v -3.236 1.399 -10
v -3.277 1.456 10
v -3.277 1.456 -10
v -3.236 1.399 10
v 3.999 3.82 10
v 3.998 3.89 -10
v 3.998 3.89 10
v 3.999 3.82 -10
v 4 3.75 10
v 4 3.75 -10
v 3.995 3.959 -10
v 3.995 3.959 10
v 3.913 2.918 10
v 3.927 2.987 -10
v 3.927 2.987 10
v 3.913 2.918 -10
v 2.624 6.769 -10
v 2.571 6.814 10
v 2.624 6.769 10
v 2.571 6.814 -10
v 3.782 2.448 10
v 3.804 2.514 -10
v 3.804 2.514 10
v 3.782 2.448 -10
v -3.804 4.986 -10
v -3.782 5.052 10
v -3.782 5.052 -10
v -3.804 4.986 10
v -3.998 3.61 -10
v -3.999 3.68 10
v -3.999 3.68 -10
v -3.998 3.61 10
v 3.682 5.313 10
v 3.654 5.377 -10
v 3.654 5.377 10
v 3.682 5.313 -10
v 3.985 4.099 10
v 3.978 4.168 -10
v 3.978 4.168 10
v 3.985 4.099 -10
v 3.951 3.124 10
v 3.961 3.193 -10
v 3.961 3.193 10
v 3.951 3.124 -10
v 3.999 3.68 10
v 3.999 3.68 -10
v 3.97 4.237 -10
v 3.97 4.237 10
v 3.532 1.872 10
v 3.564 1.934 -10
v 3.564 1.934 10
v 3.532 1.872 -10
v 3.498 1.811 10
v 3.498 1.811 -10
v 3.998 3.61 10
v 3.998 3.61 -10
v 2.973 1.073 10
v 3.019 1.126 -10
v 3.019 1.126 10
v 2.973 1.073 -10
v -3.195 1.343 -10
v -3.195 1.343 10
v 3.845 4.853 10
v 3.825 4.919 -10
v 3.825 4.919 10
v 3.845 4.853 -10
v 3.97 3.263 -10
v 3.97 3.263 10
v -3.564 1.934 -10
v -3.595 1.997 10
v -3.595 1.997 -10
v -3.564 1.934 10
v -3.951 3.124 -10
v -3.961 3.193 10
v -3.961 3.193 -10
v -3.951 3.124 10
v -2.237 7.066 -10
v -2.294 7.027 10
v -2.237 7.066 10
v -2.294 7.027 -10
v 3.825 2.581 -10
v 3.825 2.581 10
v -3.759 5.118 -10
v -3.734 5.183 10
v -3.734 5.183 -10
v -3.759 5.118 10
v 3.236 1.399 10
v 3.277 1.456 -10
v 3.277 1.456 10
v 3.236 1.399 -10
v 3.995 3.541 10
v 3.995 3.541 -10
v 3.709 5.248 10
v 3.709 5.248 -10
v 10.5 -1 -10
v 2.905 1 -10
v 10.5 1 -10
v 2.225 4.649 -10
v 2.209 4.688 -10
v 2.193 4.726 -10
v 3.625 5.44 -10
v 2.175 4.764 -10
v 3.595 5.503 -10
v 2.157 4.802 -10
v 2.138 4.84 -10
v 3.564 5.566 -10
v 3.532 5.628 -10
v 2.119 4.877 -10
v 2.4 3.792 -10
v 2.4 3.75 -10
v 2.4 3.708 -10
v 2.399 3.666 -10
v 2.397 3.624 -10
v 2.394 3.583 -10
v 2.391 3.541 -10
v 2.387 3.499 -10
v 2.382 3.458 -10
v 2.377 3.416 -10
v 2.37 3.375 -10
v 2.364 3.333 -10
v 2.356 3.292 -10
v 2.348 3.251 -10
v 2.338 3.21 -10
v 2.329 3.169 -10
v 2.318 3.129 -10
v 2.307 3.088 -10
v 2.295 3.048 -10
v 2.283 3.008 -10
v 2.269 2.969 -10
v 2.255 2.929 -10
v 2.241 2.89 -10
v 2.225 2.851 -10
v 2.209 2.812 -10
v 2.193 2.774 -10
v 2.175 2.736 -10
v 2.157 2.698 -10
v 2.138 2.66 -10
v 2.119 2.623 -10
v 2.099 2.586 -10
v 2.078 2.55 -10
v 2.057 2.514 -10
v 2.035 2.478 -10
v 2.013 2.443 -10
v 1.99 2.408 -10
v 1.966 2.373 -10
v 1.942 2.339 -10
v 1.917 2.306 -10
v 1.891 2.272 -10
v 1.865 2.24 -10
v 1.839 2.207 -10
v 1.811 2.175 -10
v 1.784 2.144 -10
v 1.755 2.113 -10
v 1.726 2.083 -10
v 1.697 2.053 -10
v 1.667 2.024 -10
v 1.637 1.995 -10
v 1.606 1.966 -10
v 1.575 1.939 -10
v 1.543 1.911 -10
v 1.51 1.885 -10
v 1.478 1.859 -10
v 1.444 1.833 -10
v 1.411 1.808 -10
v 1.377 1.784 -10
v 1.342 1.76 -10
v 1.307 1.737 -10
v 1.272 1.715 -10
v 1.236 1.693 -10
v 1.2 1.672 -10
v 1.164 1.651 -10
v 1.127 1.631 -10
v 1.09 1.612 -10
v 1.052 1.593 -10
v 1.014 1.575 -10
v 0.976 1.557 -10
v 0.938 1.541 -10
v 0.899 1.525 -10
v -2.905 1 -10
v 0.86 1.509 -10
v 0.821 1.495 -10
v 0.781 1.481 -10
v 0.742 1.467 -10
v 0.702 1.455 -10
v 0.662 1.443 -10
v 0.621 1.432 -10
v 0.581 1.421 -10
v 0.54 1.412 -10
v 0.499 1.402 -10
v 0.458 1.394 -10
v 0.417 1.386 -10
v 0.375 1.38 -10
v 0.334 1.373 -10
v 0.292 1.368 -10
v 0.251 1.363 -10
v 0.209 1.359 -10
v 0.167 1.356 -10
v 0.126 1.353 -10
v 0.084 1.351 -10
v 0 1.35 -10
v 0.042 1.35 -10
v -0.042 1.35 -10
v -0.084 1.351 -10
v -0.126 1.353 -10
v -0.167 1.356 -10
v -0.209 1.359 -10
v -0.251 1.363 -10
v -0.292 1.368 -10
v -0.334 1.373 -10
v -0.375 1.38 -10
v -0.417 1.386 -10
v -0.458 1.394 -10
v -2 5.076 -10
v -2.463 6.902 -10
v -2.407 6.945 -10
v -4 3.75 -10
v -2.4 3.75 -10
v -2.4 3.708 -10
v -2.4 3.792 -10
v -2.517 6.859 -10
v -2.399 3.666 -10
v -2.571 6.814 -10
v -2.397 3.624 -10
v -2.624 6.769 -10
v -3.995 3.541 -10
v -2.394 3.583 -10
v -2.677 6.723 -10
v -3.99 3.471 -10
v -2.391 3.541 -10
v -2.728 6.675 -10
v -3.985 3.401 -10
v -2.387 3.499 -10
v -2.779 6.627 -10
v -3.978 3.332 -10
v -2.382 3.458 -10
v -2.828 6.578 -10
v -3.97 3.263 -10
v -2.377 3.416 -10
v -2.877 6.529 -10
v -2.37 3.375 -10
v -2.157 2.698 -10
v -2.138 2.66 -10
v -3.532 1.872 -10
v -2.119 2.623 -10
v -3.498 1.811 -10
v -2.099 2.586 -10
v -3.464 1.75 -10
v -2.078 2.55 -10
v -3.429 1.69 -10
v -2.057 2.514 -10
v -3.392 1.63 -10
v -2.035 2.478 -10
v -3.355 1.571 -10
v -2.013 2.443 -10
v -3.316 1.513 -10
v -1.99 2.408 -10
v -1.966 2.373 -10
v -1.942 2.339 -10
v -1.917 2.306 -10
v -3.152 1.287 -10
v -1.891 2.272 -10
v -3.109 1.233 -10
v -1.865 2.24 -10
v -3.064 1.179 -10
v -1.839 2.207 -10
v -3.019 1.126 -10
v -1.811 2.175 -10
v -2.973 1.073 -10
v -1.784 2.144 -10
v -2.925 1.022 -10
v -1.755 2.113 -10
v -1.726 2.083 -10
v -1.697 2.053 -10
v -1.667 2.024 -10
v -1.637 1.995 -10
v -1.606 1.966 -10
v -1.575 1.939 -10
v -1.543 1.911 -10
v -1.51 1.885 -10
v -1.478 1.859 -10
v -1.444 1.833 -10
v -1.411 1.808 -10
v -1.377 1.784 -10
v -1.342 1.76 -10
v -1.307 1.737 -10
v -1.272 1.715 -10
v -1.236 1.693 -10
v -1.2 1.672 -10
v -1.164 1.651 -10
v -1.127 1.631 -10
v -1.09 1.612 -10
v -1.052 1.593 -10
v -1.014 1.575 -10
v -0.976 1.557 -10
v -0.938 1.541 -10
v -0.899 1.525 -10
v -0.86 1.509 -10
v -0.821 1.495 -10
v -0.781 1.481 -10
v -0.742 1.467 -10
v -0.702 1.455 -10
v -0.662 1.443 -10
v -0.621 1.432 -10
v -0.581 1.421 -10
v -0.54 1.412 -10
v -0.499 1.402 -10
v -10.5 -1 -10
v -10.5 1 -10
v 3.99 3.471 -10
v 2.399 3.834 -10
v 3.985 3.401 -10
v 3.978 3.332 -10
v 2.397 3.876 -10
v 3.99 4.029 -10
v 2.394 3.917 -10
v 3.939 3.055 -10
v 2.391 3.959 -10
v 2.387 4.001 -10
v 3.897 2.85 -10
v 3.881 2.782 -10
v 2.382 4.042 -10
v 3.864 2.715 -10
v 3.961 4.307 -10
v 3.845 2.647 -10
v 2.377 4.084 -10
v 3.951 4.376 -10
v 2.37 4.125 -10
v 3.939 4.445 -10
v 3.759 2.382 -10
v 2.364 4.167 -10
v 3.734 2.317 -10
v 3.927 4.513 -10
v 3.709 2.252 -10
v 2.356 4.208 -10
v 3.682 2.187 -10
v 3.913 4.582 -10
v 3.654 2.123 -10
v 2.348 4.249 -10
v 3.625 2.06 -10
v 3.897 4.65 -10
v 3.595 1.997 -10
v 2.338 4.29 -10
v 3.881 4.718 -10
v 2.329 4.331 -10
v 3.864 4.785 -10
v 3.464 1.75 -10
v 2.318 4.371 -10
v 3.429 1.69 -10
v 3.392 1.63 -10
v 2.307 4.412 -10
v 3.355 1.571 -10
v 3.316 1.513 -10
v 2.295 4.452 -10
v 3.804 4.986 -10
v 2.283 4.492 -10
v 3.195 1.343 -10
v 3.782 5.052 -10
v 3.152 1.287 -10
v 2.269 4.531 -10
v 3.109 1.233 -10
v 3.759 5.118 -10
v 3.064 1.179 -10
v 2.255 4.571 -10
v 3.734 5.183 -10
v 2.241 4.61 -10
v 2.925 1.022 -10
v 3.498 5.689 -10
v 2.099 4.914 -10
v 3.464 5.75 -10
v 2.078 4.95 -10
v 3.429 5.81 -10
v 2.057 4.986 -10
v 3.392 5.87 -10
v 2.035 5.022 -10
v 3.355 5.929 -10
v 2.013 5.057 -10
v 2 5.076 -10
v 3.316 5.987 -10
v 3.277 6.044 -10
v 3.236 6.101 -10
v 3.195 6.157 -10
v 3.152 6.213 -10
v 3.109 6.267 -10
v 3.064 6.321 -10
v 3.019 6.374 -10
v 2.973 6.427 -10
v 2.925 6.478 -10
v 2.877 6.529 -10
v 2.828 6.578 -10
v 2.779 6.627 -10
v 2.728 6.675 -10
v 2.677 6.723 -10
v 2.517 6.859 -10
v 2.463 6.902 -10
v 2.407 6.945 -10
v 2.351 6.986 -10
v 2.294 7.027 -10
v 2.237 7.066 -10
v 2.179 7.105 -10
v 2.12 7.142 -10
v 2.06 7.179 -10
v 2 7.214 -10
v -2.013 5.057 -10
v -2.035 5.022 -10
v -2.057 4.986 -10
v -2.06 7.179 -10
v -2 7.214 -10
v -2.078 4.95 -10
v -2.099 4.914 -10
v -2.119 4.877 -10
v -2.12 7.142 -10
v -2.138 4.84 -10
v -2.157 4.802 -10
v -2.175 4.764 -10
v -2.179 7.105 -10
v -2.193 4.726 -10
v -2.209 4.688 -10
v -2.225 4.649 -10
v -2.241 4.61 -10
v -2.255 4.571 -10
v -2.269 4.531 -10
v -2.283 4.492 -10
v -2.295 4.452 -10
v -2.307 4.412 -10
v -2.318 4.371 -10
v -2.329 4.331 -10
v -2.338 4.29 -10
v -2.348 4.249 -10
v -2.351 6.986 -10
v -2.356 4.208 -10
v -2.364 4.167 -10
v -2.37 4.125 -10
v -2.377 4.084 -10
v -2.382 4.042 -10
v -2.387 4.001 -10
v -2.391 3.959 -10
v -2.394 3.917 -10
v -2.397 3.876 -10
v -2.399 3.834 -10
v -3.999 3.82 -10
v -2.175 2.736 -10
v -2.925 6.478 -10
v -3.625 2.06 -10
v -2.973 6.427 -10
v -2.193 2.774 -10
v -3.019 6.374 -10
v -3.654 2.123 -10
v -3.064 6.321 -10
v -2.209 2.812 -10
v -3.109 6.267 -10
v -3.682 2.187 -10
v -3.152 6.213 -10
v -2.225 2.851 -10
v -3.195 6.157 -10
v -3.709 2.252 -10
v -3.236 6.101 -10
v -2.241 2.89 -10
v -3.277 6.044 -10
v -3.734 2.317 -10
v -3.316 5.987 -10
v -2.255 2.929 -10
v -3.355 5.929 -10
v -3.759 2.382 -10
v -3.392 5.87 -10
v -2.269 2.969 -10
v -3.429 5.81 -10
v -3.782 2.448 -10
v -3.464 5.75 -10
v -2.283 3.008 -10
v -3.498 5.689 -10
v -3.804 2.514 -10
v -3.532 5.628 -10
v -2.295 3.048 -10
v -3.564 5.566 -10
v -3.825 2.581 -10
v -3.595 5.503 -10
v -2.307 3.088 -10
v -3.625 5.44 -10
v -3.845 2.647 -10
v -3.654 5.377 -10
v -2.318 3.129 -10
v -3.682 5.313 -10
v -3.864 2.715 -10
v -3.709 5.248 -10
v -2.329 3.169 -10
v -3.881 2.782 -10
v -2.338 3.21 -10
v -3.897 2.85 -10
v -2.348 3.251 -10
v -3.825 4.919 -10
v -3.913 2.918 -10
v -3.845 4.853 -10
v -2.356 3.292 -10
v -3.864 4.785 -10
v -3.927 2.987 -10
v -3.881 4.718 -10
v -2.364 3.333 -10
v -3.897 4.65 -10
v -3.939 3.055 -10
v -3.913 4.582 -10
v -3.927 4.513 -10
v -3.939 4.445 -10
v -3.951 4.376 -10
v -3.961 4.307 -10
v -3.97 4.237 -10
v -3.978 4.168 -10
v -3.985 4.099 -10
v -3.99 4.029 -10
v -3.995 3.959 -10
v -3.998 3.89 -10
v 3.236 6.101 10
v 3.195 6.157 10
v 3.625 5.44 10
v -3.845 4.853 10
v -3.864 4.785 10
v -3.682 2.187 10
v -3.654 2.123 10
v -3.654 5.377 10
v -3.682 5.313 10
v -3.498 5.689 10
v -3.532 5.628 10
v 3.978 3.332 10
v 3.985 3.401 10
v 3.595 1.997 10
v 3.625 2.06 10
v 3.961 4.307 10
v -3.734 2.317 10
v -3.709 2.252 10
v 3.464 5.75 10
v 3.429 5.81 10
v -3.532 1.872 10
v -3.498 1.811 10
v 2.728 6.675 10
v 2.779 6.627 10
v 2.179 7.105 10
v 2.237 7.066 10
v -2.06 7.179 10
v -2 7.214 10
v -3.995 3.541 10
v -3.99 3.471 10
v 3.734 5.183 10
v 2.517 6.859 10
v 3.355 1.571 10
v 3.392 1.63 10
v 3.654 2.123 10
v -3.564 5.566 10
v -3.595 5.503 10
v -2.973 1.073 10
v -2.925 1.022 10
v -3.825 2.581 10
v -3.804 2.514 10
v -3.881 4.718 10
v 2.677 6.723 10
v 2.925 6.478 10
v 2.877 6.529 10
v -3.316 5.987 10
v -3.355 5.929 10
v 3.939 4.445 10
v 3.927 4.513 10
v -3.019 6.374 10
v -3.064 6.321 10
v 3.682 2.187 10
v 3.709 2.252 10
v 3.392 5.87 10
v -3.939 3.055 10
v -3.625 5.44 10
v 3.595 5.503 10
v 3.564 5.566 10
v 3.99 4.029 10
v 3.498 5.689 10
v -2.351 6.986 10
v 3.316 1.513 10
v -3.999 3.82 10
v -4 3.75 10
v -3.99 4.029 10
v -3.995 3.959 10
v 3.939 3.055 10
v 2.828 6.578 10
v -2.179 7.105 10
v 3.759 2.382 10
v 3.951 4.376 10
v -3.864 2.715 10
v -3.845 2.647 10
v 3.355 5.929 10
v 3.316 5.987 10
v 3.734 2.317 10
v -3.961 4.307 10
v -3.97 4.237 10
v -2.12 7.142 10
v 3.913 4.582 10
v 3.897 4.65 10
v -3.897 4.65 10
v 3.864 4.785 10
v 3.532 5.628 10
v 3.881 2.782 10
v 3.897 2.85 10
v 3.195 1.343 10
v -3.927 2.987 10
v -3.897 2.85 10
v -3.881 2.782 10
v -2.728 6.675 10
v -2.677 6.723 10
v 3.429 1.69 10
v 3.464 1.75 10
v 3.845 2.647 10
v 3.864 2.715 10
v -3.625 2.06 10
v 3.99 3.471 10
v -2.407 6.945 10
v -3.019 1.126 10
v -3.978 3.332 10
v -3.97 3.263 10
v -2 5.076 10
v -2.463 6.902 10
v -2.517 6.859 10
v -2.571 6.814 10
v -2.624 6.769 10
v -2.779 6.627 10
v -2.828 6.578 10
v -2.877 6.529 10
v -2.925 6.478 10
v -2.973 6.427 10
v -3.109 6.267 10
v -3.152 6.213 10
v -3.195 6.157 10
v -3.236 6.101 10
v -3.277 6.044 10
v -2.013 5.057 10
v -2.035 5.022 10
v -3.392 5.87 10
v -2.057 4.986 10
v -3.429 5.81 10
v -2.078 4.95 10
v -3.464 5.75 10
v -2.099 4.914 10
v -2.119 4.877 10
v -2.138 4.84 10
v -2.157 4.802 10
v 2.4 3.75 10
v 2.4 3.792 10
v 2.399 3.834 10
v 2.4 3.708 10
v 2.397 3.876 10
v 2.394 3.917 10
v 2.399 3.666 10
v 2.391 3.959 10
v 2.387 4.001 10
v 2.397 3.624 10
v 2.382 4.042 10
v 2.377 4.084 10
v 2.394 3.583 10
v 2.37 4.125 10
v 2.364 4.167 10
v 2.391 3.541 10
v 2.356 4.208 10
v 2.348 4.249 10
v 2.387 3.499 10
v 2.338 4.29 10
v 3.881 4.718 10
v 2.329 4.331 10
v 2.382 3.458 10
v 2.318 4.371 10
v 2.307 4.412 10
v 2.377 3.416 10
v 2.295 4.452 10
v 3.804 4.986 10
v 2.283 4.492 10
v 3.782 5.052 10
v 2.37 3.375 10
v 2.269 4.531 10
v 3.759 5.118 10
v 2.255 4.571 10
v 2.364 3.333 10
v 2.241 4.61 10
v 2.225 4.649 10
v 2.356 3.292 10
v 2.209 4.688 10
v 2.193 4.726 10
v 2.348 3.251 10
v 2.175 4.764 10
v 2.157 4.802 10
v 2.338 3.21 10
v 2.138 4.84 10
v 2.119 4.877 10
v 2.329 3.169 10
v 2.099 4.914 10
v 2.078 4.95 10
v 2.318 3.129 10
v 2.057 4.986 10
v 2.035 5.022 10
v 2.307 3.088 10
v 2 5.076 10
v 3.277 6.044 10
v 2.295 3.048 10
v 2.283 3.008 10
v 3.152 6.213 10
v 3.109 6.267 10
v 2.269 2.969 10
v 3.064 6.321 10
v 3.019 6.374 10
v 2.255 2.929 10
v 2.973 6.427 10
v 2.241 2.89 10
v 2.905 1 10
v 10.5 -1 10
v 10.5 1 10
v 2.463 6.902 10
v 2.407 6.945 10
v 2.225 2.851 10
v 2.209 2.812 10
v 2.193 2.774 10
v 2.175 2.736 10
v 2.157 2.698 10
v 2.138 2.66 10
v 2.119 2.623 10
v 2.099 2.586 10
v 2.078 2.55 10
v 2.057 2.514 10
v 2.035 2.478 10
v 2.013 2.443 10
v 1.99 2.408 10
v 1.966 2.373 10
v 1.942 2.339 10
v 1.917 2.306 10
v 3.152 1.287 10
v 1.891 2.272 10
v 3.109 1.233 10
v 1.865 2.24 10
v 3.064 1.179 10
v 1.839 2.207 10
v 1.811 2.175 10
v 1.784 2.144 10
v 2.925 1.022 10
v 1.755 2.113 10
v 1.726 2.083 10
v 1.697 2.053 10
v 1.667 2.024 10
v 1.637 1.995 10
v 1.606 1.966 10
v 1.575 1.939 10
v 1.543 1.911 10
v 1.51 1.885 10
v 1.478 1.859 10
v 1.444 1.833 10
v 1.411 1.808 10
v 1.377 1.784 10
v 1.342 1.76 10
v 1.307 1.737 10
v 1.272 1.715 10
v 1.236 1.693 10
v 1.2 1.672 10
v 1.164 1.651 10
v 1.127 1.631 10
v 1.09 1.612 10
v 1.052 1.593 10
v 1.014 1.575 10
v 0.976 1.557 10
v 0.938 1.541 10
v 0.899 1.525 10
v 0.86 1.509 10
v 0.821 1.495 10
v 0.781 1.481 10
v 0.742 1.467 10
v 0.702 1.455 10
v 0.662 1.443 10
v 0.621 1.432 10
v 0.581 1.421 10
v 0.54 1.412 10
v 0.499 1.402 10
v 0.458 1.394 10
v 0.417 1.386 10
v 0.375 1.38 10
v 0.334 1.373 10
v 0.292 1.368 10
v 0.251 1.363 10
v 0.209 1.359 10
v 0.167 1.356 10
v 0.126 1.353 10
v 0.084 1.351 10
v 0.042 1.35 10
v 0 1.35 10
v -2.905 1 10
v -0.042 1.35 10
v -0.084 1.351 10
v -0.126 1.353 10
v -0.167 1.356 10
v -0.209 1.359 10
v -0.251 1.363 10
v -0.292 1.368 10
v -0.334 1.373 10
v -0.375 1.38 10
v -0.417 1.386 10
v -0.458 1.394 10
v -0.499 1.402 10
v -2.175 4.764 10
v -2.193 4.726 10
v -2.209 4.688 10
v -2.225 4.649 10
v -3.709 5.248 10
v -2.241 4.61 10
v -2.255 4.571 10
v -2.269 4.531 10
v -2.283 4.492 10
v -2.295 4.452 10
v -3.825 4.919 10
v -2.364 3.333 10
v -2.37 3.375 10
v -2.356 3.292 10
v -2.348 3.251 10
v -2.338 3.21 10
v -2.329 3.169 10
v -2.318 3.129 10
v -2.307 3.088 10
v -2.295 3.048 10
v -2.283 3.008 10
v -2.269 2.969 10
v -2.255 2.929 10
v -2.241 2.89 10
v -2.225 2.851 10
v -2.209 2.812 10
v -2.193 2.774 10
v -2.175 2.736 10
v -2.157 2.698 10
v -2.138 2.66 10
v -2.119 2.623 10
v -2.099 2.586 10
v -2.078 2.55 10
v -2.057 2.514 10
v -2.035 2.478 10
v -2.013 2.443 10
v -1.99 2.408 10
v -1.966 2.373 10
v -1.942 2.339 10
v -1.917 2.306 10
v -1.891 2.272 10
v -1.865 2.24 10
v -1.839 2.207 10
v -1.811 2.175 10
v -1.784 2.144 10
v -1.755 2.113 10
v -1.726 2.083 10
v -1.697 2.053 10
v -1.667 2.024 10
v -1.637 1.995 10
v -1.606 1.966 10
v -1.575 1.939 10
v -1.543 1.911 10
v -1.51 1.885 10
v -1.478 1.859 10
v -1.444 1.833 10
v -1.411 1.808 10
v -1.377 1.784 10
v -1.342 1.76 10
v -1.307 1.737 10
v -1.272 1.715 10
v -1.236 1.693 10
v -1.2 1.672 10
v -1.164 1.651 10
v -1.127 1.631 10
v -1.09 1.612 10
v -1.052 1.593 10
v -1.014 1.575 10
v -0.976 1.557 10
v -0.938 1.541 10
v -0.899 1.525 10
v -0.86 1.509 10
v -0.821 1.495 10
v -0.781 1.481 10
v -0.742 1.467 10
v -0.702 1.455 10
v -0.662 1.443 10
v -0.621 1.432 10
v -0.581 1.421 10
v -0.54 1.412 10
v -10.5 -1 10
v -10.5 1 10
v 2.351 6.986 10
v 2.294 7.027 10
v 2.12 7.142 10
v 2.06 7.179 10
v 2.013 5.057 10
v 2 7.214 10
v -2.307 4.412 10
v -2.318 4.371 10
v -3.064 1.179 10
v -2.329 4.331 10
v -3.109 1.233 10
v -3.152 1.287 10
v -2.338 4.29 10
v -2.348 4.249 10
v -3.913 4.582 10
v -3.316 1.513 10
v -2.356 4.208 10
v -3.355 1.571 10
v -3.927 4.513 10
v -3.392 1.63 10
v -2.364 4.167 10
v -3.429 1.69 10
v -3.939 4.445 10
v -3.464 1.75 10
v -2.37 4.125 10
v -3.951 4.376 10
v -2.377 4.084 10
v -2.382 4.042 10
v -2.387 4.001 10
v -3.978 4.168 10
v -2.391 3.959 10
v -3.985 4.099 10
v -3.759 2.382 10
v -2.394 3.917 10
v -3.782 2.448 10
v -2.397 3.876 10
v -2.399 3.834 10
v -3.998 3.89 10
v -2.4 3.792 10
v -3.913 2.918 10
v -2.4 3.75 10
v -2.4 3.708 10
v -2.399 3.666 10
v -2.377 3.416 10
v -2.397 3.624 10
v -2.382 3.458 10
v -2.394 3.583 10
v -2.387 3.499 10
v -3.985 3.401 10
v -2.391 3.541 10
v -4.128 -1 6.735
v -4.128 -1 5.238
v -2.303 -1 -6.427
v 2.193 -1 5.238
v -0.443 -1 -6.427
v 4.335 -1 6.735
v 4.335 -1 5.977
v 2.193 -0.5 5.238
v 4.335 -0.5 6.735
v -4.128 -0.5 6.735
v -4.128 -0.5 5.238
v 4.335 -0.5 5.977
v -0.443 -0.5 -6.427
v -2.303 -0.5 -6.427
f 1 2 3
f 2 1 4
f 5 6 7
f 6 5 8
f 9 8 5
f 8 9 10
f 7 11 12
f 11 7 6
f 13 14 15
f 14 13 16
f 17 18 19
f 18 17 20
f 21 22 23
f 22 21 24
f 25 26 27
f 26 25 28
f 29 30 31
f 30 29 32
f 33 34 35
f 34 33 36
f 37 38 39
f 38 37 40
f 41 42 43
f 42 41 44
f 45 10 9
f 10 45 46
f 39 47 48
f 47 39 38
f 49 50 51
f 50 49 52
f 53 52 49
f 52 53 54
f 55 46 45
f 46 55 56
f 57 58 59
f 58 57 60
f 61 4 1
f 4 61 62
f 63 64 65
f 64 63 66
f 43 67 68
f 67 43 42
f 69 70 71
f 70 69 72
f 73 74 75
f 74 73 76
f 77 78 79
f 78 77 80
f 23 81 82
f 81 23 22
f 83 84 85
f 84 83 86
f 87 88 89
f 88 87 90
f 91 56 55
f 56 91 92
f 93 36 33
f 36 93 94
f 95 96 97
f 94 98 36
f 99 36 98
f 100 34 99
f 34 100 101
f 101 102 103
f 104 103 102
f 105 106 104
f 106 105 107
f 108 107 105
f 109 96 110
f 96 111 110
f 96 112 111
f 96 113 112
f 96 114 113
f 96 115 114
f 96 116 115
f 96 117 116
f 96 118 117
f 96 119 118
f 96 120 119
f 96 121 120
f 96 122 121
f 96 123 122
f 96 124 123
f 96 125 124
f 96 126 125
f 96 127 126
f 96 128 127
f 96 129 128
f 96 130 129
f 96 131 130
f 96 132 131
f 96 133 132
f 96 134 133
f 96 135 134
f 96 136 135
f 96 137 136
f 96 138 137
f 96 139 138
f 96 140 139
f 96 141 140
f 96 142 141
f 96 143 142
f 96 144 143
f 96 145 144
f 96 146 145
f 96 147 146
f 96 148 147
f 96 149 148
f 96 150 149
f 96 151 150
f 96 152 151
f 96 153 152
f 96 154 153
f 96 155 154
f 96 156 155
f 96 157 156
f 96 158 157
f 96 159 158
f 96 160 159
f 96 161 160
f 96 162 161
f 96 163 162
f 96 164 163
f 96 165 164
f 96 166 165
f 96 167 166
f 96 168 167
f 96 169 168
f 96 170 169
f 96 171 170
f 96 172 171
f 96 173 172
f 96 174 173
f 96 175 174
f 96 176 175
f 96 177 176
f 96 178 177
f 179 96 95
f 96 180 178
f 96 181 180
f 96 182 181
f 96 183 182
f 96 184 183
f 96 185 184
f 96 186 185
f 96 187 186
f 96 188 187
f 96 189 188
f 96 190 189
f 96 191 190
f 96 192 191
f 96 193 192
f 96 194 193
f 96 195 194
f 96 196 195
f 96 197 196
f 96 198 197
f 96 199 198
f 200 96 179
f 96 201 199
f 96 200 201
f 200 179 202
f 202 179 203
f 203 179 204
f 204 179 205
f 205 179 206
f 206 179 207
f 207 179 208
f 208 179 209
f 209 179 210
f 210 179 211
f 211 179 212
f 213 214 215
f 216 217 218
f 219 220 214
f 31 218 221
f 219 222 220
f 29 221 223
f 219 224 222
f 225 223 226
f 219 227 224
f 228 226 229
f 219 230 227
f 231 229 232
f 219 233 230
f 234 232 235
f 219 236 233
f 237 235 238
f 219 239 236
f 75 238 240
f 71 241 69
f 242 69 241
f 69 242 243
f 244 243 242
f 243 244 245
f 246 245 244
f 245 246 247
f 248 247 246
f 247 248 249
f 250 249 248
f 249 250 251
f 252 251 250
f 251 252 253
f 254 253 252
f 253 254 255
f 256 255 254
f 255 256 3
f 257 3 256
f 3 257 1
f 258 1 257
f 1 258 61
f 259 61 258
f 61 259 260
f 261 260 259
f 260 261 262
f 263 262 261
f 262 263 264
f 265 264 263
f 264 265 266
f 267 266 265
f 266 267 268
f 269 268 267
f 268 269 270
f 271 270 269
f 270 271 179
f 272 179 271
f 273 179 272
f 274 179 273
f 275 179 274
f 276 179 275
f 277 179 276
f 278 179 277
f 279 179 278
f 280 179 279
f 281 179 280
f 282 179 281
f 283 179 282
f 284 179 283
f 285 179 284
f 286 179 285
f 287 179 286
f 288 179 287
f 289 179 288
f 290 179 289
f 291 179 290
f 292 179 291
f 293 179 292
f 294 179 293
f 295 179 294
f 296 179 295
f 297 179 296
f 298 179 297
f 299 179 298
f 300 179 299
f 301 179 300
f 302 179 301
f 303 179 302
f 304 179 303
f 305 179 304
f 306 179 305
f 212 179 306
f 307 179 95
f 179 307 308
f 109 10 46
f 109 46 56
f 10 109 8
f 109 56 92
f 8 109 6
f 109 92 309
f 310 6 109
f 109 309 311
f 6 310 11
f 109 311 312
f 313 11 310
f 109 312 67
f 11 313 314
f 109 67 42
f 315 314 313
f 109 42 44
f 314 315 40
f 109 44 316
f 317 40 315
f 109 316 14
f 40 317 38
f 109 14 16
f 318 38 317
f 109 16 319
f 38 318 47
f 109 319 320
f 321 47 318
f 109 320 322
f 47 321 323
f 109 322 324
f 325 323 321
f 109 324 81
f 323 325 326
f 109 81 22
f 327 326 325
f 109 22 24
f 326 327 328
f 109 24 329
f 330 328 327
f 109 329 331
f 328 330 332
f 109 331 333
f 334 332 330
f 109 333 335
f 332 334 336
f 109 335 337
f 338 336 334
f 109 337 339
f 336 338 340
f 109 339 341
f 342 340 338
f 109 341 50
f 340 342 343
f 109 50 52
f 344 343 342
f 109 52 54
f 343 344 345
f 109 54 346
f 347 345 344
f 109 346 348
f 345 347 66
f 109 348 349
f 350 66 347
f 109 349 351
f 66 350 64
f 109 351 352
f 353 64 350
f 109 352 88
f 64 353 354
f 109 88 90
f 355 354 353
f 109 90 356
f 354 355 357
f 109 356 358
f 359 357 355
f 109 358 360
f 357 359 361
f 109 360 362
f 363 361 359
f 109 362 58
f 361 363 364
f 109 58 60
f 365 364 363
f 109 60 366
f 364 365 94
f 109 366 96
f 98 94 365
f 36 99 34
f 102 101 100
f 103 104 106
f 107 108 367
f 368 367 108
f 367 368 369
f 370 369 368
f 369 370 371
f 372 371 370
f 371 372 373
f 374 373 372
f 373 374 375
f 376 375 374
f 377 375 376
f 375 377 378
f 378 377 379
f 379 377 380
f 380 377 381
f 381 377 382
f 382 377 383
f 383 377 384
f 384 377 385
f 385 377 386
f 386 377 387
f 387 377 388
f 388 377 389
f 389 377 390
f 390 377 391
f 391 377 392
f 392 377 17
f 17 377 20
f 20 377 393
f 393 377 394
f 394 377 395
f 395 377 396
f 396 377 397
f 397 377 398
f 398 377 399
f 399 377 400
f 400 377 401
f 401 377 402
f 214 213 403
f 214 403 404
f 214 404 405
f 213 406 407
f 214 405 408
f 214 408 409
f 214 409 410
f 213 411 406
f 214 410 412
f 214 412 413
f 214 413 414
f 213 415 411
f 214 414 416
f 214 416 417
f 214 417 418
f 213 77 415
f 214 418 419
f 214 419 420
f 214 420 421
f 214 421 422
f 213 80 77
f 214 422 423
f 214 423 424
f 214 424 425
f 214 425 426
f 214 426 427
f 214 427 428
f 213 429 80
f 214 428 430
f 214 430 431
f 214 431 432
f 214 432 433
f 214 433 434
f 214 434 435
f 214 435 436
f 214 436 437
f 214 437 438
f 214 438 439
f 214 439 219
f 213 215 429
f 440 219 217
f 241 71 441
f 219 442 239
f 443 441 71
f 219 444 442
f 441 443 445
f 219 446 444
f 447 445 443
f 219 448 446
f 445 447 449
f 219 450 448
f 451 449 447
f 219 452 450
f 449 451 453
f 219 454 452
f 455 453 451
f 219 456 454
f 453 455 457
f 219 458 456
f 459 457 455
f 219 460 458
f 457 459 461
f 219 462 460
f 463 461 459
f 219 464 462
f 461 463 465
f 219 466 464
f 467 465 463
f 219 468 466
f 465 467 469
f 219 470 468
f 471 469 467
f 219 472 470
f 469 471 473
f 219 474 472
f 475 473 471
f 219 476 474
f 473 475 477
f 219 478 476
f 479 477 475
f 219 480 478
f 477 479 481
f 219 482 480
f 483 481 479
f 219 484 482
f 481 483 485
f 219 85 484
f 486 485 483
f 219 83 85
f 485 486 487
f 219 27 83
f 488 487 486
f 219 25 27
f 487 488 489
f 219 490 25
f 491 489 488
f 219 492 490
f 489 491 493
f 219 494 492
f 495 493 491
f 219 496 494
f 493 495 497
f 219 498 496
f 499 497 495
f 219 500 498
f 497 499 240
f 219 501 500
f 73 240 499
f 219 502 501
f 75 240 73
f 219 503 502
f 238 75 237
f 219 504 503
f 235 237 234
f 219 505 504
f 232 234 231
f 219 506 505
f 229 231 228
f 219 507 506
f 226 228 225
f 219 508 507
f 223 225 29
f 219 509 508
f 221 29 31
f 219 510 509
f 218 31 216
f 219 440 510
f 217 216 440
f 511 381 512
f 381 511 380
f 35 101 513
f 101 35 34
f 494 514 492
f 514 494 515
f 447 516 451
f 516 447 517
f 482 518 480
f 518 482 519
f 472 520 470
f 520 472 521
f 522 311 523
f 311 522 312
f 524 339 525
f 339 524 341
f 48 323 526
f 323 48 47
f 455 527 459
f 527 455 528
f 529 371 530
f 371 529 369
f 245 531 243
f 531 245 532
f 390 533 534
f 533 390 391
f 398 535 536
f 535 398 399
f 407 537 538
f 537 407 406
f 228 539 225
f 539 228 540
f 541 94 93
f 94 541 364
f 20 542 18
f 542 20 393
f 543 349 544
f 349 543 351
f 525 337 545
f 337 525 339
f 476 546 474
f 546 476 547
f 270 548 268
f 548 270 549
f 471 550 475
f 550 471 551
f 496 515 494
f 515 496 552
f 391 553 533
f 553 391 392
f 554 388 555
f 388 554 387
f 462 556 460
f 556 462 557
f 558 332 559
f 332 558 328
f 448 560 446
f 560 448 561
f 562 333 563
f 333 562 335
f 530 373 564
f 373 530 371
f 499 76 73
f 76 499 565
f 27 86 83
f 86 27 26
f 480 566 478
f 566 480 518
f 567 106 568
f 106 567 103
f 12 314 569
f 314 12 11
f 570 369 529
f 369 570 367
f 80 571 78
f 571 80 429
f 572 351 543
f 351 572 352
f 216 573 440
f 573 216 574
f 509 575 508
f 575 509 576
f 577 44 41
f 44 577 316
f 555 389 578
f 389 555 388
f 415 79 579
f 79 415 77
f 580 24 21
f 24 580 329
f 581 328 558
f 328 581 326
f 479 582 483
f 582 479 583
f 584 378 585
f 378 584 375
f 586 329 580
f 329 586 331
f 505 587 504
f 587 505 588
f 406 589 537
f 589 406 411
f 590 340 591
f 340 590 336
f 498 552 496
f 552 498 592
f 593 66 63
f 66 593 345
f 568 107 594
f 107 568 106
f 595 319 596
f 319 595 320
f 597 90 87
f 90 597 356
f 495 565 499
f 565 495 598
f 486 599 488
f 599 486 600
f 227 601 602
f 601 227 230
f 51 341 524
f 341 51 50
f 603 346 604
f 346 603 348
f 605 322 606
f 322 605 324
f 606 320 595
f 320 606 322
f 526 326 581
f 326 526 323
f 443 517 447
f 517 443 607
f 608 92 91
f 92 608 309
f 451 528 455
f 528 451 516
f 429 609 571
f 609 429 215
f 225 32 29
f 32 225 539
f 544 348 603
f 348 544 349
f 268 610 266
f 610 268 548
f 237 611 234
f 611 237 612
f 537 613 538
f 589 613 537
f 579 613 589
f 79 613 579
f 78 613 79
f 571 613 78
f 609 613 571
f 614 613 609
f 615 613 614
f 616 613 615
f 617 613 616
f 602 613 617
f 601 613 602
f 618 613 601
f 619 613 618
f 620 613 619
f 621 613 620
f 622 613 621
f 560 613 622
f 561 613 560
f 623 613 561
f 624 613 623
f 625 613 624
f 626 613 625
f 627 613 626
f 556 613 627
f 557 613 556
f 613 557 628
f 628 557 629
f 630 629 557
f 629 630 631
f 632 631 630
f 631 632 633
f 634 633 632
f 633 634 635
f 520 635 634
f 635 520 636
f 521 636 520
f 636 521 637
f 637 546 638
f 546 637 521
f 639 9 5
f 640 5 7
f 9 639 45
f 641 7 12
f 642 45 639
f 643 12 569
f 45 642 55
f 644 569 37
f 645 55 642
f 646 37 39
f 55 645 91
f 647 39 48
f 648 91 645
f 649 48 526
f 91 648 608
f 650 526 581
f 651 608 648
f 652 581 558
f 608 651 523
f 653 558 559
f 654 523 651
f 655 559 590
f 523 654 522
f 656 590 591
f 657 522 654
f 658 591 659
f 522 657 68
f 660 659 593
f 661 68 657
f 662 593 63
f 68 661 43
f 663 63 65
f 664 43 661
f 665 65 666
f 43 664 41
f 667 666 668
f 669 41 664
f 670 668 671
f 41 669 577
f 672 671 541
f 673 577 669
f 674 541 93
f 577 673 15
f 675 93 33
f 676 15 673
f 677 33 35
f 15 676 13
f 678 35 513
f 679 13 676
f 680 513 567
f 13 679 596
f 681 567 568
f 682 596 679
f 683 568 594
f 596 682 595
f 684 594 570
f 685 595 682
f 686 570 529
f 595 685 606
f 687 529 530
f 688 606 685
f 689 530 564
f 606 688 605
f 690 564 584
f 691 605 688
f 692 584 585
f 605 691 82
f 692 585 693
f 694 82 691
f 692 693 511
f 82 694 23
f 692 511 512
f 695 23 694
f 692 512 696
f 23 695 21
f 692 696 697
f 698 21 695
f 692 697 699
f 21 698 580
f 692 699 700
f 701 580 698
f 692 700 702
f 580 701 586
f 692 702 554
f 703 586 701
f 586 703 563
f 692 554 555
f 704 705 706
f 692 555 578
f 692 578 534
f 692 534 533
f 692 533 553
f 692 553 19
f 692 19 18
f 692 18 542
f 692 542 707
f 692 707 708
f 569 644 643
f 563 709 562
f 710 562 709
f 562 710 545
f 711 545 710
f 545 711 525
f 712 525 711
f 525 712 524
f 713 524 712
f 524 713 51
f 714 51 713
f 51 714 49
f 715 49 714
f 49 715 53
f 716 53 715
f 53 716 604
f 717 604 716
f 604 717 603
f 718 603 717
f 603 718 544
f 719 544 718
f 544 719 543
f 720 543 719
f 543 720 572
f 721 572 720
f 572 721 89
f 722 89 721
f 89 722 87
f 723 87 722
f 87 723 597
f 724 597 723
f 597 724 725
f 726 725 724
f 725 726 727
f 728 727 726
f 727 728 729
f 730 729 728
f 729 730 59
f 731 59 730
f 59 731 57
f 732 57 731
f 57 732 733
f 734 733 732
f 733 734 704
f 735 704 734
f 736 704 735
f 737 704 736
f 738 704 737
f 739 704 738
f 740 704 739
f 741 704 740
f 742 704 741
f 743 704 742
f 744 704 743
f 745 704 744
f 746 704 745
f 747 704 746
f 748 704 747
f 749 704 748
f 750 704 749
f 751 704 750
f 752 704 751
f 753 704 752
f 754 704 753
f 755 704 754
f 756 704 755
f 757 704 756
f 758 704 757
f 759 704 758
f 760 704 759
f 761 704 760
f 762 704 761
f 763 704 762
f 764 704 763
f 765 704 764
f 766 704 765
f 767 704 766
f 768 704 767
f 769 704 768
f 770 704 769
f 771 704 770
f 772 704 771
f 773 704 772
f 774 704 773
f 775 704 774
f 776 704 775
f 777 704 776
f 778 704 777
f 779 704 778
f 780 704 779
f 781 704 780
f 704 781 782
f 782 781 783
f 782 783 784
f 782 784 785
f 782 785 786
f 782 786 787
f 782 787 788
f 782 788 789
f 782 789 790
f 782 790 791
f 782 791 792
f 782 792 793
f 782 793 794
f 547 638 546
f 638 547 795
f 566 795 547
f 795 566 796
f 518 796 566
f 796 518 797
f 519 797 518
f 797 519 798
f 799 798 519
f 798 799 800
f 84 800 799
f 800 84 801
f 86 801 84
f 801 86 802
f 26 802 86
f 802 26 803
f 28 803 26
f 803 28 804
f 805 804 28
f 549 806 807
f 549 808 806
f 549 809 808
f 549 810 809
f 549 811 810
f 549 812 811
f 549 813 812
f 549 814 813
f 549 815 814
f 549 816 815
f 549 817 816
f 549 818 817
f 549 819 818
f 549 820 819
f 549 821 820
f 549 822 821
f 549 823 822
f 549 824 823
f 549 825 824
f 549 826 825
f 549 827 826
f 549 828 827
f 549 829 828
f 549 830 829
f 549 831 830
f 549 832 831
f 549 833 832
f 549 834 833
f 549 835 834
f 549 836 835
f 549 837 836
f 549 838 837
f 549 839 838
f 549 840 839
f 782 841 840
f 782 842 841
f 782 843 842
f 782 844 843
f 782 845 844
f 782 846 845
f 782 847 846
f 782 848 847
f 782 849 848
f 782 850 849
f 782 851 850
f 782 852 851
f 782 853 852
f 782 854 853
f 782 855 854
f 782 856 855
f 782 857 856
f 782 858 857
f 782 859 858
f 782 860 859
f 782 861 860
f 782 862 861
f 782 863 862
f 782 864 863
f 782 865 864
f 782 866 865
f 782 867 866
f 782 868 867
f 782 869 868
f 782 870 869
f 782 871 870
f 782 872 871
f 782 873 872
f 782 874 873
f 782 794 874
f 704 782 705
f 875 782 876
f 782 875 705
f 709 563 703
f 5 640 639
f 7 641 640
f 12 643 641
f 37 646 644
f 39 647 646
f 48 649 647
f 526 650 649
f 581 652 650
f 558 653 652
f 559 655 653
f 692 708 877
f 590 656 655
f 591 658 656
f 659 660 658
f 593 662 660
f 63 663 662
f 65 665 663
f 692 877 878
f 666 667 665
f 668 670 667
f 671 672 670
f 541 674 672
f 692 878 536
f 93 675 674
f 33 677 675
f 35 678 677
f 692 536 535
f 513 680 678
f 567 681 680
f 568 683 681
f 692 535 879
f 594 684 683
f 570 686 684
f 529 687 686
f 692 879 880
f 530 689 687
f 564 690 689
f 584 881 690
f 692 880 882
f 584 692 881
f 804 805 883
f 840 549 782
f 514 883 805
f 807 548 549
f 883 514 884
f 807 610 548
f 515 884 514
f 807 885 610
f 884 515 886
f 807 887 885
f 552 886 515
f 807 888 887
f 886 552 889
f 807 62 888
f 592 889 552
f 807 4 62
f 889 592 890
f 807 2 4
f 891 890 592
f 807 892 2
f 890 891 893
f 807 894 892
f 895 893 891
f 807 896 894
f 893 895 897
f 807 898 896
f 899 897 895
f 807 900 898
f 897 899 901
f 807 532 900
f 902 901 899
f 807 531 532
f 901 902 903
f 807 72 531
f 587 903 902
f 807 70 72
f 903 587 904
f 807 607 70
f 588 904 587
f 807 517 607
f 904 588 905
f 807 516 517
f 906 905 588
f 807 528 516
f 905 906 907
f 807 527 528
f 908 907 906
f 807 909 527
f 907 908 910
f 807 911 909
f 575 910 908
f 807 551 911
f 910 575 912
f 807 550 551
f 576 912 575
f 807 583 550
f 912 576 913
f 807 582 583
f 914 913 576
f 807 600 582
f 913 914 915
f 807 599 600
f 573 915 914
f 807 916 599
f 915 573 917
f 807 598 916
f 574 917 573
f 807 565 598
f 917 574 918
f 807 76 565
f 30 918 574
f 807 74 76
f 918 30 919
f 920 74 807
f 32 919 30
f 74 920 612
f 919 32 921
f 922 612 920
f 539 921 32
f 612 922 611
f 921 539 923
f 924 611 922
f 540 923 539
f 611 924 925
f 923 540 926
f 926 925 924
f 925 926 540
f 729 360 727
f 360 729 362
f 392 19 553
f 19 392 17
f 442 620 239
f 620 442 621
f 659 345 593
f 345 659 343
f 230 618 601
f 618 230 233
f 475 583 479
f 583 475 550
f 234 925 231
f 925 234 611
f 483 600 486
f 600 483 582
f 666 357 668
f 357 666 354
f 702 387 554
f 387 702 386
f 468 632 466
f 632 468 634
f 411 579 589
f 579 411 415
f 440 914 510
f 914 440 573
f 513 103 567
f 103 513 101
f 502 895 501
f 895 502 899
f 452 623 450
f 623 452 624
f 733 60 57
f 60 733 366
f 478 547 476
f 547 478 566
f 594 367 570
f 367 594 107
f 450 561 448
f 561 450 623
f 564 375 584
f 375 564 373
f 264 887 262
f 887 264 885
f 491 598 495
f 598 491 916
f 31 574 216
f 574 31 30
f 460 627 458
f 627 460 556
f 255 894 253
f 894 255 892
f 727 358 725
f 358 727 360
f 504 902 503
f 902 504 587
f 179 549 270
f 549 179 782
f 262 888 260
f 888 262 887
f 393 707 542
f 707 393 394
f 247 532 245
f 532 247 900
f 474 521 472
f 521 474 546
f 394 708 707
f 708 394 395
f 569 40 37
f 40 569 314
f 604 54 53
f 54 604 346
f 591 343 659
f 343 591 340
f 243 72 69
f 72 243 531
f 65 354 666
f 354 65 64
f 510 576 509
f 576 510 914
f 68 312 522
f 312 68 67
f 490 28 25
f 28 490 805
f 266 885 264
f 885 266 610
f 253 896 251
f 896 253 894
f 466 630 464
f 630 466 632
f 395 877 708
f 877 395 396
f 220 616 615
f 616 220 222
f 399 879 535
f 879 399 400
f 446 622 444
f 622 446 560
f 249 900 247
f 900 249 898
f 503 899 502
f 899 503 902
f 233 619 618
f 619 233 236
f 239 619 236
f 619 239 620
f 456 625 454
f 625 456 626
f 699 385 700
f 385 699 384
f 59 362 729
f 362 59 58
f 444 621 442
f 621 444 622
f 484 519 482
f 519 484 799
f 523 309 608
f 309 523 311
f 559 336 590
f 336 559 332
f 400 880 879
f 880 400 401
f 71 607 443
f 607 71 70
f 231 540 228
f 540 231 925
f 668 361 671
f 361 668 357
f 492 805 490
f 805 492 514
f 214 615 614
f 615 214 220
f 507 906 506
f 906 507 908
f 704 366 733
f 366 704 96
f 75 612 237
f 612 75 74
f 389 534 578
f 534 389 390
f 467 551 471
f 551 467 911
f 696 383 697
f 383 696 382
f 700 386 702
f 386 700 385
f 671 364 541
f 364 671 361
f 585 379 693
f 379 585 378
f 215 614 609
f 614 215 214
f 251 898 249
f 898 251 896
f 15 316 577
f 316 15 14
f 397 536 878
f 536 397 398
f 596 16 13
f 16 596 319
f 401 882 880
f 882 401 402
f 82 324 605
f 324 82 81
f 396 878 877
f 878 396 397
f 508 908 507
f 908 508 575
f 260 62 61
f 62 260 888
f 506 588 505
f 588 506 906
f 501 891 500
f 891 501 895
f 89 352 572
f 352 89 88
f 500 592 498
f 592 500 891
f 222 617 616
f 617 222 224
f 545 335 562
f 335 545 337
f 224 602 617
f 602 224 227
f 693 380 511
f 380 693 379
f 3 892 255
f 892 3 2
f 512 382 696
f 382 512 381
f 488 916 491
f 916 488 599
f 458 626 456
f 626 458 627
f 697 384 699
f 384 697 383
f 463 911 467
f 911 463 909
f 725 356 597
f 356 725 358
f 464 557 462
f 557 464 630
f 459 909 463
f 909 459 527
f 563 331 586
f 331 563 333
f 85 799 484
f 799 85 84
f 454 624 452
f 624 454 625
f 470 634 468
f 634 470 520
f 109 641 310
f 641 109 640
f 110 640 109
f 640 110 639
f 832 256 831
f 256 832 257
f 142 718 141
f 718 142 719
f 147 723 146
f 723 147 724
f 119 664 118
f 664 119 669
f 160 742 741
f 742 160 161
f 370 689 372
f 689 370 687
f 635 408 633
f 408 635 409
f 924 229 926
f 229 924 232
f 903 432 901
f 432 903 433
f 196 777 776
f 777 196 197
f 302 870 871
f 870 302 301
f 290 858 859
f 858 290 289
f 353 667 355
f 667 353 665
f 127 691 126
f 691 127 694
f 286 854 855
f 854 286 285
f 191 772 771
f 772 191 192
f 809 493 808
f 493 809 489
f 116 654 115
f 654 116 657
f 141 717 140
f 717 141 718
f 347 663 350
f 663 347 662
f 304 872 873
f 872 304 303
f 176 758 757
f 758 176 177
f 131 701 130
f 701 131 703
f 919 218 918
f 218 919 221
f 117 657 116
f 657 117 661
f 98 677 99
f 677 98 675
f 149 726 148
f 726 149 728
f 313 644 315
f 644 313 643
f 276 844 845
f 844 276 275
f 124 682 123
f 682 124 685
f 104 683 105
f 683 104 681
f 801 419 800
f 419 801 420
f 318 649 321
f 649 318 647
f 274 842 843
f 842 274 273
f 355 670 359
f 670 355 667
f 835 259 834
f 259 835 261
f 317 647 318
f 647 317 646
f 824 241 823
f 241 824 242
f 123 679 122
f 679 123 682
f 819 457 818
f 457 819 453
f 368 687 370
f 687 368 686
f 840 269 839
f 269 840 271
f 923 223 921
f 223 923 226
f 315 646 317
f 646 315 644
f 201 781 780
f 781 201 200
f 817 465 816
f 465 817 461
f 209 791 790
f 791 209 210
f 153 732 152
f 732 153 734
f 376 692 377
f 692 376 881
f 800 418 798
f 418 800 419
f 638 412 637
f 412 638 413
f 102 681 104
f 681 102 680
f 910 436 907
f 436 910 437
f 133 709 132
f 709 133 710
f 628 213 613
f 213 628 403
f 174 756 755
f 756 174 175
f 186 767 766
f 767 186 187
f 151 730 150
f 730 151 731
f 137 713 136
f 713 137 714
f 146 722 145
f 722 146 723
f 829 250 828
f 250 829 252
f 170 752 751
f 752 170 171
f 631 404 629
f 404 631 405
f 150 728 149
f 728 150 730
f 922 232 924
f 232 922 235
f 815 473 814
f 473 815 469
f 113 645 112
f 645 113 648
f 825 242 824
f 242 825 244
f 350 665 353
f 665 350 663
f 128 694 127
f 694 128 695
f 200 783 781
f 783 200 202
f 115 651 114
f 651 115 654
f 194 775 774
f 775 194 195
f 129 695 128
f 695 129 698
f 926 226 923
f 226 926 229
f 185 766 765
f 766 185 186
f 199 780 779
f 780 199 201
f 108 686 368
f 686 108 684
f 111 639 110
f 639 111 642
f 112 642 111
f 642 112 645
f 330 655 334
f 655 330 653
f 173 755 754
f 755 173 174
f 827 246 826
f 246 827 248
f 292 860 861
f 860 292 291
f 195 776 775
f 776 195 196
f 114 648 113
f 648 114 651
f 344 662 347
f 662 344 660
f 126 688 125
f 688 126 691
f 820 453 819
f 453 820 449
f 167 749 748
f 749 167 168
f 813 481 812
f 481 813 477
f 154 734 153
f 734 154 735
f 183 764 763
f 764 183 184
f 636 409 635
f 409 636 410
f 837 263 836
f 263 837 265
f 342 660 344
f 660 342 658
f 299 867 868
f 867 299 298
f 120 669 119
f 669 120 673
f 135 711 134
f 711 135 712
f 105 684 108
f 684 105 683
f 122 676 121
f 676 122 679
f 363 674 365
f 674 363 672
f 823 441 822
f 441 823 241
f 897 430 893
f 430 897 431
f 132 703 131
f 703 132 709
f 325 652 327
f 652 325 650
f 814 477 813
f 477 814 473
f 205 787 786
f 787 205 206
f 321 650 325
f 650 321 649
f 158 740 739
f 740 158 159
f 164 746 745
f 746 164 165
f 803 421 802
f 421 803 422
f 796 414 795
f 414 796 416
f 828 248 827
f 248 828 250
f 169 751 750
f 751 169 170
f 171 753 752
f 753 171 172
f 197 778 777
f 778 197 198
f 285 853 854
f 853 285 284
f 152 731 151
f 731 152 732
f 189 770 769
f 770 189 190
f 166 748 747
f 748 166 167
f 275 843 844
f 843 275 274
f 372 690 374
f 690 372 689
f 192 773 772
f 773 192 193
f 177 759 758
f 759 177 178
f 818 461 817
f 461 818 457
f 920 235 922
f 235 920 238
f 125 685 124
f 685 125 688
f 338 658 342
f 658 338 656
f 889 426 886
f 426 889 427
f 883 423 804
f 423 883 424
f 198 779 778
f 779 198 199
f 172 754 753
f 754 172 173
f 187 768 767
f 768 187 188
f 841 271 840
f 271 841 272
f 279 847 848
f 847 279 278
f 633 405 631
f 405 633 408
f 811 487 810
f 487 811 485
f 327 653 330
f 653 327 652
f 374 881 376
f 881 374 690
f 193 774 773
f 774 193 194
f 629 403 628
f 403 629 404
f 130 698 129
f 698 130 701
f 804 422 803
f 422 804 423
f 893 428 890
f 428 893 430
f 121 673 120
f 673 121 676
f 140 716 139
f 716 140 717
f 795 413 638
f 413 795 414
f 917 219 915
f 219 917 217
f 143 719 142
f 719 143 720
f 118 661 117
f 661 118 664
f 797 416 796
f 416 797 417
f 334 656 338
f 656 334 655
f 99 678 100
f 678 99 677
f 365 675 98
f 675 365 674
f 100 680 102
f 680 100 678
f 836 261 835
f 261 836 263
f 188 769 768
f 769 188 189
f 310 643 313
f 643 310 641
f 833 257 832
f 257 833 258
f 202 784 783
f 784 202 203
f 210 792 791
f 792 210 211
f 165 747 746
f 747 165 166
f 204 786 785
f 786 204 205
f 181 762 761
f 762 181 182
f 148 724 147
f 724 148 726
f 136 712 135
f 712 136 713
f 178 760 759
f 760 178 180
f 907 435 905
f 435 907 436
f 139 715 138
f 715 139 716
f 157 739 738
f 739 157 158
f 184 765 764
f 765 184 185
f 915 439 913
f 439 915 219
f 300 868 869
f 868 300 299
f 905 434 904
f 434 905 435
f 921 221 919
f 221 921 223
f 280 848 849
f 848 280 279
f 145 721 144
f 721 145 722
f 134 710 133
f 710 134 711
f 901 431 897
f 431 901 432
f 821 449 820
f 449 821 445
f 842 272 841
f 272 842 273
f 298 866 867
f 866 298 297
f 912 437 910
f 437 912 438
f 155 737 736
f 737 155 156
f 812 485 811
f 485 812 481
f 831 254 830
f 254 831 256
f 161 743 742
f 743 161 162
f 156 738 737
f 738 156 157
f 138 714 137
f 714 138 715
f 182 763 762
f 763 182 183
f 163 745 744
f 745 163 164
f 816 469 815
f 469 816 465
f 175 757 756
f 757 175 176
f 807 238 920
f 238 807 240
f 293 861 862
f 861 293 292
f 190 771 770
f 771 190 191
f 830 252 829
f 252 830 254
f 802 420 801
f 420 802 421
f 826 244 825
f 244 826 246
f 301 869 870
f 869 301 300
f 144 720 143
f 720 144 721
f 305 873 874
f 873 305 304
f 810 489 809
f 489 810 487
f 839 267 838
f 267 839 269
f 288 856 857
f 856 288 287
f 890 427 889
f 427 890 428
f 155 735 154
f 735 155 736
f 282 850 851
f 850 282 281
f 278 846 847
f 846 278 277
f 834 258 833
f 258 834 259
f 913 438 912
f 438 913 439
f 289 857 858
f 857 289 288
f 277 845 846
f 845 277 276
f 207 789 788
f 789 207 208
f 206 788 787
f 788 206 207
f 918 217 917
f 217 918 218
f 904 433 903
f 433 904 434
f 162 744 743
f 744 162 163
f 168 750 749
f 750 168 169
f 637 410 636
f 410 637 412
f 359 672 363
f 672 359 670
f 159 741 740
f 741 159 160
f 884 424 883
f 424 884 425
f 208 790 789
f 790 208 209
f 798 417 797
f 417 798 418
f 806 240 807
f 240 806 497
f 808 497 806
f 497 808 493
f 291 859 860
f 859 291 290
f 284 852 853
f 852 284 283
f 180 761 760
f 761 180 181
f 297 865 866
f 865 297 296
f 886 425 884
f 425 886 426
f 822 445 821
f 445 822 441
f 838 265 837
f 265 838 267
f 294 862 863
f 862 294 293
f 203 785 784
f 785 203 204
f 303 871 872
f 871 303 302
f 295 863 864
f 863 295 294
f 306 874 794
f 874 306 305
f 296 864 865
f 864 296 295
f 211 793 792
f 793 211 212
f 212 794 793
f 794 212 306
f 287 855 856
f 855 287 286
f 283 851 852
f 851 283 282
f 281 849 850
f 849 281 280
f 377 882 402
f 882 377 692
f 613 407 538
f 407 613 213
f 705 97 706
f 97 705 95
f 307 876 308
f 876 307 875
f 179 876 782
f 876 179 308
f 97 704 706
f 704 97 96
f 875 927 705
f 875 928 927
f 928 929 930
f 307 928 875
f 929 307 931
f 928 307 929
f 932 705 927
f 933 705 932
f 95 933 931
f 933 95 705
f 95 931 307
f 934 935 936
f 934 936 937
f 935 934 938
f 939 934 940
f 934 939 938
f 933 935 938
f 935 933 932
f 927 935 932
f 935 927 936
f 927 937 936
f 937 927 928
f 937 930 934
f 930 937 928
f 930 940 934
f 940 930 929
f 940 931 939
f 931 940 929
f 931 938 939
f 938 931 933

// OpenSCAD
///////////////
// Version 1 of the Customizer version of http://www.thingiverse.com/thing:1693879
// Basic functionality (number or blank, change font)
// Add requests in comments
// TODO: alter clip dimensions/allow for more than 2 numbers (letters too? 3 chars?)
// Please post made pics ;)
//////////////
/* [Hidden] */
$fn=360;
 halign = [
   [-20, "left"],
   [0, "center"],
   [90, "right"]
 ];
  valign = [
   [  0, "top"],
   [ 40, "center"],
   [ 75, "baseline"],
   [110, "bottom"]
 ];

//
/* [Basic Configuration] */
//Choose -1 for blank, otherwise pick a number!
tag_text=7;//[-1:1:99]
font_name="Share Tech Mono"; //[Cousine,Droid Sans Mono,Fira Mono,Inconsolata,Nova Mono,Oxygen Mono,PT Mono,Roboto Mono,Share Tech Mono,Source Code Pro,Space Mono,Ubuntu Mono]

CreateBlank();
echo (str(tag_text));
if ((tag_text)!=-1) 
	{ 
		echo ("False");
		CreateText();
	}    
 module CreateText()
	{	      
	difference()
	{
		cube([21,2,20],center=true) ; //TagFront	
		translate ([0,-0.5,0]) rotate ([90,0,0])linear_extrude(height=1) 
		text(str(tag_text),13,font_name,halign="center",valign="center"); 
	}
}
module CreateBlank()
	{   
		difference(){    
			translate ([0,3.75,0]) color ("green") cylinder(r=4,h=20, center=true); //Clip Outside
			translate ([0,3.75,0]) color("Blue") cylinder(r=2.4,h=22, center=true); //Clip Inside
			translate ([0,6,0]) color("red") cube([4,4,22],center=true); //Clip Opening
		}
	
	if ((tag_text)==-1)
		{
		difference(){
			cube([21,2,20],center=true); //TagFront	
			translate ([0,-1,0]) cube([20.5,0.5,19.5],center=true); //BeveledBlank
			}	
		}
	}
 module cylinder_outer(height,radius,fn){
   fudge = 1/cos(180/fn);
   cylinder(h=height,r=radius*fudge,$fn=fn);}
 module cylinder_mid(height,radius,fn){
   fudge = (1+1/cos(180/fn))/2;
   cylinder(h=height,r=radius*fudge,$fn=fn);}
